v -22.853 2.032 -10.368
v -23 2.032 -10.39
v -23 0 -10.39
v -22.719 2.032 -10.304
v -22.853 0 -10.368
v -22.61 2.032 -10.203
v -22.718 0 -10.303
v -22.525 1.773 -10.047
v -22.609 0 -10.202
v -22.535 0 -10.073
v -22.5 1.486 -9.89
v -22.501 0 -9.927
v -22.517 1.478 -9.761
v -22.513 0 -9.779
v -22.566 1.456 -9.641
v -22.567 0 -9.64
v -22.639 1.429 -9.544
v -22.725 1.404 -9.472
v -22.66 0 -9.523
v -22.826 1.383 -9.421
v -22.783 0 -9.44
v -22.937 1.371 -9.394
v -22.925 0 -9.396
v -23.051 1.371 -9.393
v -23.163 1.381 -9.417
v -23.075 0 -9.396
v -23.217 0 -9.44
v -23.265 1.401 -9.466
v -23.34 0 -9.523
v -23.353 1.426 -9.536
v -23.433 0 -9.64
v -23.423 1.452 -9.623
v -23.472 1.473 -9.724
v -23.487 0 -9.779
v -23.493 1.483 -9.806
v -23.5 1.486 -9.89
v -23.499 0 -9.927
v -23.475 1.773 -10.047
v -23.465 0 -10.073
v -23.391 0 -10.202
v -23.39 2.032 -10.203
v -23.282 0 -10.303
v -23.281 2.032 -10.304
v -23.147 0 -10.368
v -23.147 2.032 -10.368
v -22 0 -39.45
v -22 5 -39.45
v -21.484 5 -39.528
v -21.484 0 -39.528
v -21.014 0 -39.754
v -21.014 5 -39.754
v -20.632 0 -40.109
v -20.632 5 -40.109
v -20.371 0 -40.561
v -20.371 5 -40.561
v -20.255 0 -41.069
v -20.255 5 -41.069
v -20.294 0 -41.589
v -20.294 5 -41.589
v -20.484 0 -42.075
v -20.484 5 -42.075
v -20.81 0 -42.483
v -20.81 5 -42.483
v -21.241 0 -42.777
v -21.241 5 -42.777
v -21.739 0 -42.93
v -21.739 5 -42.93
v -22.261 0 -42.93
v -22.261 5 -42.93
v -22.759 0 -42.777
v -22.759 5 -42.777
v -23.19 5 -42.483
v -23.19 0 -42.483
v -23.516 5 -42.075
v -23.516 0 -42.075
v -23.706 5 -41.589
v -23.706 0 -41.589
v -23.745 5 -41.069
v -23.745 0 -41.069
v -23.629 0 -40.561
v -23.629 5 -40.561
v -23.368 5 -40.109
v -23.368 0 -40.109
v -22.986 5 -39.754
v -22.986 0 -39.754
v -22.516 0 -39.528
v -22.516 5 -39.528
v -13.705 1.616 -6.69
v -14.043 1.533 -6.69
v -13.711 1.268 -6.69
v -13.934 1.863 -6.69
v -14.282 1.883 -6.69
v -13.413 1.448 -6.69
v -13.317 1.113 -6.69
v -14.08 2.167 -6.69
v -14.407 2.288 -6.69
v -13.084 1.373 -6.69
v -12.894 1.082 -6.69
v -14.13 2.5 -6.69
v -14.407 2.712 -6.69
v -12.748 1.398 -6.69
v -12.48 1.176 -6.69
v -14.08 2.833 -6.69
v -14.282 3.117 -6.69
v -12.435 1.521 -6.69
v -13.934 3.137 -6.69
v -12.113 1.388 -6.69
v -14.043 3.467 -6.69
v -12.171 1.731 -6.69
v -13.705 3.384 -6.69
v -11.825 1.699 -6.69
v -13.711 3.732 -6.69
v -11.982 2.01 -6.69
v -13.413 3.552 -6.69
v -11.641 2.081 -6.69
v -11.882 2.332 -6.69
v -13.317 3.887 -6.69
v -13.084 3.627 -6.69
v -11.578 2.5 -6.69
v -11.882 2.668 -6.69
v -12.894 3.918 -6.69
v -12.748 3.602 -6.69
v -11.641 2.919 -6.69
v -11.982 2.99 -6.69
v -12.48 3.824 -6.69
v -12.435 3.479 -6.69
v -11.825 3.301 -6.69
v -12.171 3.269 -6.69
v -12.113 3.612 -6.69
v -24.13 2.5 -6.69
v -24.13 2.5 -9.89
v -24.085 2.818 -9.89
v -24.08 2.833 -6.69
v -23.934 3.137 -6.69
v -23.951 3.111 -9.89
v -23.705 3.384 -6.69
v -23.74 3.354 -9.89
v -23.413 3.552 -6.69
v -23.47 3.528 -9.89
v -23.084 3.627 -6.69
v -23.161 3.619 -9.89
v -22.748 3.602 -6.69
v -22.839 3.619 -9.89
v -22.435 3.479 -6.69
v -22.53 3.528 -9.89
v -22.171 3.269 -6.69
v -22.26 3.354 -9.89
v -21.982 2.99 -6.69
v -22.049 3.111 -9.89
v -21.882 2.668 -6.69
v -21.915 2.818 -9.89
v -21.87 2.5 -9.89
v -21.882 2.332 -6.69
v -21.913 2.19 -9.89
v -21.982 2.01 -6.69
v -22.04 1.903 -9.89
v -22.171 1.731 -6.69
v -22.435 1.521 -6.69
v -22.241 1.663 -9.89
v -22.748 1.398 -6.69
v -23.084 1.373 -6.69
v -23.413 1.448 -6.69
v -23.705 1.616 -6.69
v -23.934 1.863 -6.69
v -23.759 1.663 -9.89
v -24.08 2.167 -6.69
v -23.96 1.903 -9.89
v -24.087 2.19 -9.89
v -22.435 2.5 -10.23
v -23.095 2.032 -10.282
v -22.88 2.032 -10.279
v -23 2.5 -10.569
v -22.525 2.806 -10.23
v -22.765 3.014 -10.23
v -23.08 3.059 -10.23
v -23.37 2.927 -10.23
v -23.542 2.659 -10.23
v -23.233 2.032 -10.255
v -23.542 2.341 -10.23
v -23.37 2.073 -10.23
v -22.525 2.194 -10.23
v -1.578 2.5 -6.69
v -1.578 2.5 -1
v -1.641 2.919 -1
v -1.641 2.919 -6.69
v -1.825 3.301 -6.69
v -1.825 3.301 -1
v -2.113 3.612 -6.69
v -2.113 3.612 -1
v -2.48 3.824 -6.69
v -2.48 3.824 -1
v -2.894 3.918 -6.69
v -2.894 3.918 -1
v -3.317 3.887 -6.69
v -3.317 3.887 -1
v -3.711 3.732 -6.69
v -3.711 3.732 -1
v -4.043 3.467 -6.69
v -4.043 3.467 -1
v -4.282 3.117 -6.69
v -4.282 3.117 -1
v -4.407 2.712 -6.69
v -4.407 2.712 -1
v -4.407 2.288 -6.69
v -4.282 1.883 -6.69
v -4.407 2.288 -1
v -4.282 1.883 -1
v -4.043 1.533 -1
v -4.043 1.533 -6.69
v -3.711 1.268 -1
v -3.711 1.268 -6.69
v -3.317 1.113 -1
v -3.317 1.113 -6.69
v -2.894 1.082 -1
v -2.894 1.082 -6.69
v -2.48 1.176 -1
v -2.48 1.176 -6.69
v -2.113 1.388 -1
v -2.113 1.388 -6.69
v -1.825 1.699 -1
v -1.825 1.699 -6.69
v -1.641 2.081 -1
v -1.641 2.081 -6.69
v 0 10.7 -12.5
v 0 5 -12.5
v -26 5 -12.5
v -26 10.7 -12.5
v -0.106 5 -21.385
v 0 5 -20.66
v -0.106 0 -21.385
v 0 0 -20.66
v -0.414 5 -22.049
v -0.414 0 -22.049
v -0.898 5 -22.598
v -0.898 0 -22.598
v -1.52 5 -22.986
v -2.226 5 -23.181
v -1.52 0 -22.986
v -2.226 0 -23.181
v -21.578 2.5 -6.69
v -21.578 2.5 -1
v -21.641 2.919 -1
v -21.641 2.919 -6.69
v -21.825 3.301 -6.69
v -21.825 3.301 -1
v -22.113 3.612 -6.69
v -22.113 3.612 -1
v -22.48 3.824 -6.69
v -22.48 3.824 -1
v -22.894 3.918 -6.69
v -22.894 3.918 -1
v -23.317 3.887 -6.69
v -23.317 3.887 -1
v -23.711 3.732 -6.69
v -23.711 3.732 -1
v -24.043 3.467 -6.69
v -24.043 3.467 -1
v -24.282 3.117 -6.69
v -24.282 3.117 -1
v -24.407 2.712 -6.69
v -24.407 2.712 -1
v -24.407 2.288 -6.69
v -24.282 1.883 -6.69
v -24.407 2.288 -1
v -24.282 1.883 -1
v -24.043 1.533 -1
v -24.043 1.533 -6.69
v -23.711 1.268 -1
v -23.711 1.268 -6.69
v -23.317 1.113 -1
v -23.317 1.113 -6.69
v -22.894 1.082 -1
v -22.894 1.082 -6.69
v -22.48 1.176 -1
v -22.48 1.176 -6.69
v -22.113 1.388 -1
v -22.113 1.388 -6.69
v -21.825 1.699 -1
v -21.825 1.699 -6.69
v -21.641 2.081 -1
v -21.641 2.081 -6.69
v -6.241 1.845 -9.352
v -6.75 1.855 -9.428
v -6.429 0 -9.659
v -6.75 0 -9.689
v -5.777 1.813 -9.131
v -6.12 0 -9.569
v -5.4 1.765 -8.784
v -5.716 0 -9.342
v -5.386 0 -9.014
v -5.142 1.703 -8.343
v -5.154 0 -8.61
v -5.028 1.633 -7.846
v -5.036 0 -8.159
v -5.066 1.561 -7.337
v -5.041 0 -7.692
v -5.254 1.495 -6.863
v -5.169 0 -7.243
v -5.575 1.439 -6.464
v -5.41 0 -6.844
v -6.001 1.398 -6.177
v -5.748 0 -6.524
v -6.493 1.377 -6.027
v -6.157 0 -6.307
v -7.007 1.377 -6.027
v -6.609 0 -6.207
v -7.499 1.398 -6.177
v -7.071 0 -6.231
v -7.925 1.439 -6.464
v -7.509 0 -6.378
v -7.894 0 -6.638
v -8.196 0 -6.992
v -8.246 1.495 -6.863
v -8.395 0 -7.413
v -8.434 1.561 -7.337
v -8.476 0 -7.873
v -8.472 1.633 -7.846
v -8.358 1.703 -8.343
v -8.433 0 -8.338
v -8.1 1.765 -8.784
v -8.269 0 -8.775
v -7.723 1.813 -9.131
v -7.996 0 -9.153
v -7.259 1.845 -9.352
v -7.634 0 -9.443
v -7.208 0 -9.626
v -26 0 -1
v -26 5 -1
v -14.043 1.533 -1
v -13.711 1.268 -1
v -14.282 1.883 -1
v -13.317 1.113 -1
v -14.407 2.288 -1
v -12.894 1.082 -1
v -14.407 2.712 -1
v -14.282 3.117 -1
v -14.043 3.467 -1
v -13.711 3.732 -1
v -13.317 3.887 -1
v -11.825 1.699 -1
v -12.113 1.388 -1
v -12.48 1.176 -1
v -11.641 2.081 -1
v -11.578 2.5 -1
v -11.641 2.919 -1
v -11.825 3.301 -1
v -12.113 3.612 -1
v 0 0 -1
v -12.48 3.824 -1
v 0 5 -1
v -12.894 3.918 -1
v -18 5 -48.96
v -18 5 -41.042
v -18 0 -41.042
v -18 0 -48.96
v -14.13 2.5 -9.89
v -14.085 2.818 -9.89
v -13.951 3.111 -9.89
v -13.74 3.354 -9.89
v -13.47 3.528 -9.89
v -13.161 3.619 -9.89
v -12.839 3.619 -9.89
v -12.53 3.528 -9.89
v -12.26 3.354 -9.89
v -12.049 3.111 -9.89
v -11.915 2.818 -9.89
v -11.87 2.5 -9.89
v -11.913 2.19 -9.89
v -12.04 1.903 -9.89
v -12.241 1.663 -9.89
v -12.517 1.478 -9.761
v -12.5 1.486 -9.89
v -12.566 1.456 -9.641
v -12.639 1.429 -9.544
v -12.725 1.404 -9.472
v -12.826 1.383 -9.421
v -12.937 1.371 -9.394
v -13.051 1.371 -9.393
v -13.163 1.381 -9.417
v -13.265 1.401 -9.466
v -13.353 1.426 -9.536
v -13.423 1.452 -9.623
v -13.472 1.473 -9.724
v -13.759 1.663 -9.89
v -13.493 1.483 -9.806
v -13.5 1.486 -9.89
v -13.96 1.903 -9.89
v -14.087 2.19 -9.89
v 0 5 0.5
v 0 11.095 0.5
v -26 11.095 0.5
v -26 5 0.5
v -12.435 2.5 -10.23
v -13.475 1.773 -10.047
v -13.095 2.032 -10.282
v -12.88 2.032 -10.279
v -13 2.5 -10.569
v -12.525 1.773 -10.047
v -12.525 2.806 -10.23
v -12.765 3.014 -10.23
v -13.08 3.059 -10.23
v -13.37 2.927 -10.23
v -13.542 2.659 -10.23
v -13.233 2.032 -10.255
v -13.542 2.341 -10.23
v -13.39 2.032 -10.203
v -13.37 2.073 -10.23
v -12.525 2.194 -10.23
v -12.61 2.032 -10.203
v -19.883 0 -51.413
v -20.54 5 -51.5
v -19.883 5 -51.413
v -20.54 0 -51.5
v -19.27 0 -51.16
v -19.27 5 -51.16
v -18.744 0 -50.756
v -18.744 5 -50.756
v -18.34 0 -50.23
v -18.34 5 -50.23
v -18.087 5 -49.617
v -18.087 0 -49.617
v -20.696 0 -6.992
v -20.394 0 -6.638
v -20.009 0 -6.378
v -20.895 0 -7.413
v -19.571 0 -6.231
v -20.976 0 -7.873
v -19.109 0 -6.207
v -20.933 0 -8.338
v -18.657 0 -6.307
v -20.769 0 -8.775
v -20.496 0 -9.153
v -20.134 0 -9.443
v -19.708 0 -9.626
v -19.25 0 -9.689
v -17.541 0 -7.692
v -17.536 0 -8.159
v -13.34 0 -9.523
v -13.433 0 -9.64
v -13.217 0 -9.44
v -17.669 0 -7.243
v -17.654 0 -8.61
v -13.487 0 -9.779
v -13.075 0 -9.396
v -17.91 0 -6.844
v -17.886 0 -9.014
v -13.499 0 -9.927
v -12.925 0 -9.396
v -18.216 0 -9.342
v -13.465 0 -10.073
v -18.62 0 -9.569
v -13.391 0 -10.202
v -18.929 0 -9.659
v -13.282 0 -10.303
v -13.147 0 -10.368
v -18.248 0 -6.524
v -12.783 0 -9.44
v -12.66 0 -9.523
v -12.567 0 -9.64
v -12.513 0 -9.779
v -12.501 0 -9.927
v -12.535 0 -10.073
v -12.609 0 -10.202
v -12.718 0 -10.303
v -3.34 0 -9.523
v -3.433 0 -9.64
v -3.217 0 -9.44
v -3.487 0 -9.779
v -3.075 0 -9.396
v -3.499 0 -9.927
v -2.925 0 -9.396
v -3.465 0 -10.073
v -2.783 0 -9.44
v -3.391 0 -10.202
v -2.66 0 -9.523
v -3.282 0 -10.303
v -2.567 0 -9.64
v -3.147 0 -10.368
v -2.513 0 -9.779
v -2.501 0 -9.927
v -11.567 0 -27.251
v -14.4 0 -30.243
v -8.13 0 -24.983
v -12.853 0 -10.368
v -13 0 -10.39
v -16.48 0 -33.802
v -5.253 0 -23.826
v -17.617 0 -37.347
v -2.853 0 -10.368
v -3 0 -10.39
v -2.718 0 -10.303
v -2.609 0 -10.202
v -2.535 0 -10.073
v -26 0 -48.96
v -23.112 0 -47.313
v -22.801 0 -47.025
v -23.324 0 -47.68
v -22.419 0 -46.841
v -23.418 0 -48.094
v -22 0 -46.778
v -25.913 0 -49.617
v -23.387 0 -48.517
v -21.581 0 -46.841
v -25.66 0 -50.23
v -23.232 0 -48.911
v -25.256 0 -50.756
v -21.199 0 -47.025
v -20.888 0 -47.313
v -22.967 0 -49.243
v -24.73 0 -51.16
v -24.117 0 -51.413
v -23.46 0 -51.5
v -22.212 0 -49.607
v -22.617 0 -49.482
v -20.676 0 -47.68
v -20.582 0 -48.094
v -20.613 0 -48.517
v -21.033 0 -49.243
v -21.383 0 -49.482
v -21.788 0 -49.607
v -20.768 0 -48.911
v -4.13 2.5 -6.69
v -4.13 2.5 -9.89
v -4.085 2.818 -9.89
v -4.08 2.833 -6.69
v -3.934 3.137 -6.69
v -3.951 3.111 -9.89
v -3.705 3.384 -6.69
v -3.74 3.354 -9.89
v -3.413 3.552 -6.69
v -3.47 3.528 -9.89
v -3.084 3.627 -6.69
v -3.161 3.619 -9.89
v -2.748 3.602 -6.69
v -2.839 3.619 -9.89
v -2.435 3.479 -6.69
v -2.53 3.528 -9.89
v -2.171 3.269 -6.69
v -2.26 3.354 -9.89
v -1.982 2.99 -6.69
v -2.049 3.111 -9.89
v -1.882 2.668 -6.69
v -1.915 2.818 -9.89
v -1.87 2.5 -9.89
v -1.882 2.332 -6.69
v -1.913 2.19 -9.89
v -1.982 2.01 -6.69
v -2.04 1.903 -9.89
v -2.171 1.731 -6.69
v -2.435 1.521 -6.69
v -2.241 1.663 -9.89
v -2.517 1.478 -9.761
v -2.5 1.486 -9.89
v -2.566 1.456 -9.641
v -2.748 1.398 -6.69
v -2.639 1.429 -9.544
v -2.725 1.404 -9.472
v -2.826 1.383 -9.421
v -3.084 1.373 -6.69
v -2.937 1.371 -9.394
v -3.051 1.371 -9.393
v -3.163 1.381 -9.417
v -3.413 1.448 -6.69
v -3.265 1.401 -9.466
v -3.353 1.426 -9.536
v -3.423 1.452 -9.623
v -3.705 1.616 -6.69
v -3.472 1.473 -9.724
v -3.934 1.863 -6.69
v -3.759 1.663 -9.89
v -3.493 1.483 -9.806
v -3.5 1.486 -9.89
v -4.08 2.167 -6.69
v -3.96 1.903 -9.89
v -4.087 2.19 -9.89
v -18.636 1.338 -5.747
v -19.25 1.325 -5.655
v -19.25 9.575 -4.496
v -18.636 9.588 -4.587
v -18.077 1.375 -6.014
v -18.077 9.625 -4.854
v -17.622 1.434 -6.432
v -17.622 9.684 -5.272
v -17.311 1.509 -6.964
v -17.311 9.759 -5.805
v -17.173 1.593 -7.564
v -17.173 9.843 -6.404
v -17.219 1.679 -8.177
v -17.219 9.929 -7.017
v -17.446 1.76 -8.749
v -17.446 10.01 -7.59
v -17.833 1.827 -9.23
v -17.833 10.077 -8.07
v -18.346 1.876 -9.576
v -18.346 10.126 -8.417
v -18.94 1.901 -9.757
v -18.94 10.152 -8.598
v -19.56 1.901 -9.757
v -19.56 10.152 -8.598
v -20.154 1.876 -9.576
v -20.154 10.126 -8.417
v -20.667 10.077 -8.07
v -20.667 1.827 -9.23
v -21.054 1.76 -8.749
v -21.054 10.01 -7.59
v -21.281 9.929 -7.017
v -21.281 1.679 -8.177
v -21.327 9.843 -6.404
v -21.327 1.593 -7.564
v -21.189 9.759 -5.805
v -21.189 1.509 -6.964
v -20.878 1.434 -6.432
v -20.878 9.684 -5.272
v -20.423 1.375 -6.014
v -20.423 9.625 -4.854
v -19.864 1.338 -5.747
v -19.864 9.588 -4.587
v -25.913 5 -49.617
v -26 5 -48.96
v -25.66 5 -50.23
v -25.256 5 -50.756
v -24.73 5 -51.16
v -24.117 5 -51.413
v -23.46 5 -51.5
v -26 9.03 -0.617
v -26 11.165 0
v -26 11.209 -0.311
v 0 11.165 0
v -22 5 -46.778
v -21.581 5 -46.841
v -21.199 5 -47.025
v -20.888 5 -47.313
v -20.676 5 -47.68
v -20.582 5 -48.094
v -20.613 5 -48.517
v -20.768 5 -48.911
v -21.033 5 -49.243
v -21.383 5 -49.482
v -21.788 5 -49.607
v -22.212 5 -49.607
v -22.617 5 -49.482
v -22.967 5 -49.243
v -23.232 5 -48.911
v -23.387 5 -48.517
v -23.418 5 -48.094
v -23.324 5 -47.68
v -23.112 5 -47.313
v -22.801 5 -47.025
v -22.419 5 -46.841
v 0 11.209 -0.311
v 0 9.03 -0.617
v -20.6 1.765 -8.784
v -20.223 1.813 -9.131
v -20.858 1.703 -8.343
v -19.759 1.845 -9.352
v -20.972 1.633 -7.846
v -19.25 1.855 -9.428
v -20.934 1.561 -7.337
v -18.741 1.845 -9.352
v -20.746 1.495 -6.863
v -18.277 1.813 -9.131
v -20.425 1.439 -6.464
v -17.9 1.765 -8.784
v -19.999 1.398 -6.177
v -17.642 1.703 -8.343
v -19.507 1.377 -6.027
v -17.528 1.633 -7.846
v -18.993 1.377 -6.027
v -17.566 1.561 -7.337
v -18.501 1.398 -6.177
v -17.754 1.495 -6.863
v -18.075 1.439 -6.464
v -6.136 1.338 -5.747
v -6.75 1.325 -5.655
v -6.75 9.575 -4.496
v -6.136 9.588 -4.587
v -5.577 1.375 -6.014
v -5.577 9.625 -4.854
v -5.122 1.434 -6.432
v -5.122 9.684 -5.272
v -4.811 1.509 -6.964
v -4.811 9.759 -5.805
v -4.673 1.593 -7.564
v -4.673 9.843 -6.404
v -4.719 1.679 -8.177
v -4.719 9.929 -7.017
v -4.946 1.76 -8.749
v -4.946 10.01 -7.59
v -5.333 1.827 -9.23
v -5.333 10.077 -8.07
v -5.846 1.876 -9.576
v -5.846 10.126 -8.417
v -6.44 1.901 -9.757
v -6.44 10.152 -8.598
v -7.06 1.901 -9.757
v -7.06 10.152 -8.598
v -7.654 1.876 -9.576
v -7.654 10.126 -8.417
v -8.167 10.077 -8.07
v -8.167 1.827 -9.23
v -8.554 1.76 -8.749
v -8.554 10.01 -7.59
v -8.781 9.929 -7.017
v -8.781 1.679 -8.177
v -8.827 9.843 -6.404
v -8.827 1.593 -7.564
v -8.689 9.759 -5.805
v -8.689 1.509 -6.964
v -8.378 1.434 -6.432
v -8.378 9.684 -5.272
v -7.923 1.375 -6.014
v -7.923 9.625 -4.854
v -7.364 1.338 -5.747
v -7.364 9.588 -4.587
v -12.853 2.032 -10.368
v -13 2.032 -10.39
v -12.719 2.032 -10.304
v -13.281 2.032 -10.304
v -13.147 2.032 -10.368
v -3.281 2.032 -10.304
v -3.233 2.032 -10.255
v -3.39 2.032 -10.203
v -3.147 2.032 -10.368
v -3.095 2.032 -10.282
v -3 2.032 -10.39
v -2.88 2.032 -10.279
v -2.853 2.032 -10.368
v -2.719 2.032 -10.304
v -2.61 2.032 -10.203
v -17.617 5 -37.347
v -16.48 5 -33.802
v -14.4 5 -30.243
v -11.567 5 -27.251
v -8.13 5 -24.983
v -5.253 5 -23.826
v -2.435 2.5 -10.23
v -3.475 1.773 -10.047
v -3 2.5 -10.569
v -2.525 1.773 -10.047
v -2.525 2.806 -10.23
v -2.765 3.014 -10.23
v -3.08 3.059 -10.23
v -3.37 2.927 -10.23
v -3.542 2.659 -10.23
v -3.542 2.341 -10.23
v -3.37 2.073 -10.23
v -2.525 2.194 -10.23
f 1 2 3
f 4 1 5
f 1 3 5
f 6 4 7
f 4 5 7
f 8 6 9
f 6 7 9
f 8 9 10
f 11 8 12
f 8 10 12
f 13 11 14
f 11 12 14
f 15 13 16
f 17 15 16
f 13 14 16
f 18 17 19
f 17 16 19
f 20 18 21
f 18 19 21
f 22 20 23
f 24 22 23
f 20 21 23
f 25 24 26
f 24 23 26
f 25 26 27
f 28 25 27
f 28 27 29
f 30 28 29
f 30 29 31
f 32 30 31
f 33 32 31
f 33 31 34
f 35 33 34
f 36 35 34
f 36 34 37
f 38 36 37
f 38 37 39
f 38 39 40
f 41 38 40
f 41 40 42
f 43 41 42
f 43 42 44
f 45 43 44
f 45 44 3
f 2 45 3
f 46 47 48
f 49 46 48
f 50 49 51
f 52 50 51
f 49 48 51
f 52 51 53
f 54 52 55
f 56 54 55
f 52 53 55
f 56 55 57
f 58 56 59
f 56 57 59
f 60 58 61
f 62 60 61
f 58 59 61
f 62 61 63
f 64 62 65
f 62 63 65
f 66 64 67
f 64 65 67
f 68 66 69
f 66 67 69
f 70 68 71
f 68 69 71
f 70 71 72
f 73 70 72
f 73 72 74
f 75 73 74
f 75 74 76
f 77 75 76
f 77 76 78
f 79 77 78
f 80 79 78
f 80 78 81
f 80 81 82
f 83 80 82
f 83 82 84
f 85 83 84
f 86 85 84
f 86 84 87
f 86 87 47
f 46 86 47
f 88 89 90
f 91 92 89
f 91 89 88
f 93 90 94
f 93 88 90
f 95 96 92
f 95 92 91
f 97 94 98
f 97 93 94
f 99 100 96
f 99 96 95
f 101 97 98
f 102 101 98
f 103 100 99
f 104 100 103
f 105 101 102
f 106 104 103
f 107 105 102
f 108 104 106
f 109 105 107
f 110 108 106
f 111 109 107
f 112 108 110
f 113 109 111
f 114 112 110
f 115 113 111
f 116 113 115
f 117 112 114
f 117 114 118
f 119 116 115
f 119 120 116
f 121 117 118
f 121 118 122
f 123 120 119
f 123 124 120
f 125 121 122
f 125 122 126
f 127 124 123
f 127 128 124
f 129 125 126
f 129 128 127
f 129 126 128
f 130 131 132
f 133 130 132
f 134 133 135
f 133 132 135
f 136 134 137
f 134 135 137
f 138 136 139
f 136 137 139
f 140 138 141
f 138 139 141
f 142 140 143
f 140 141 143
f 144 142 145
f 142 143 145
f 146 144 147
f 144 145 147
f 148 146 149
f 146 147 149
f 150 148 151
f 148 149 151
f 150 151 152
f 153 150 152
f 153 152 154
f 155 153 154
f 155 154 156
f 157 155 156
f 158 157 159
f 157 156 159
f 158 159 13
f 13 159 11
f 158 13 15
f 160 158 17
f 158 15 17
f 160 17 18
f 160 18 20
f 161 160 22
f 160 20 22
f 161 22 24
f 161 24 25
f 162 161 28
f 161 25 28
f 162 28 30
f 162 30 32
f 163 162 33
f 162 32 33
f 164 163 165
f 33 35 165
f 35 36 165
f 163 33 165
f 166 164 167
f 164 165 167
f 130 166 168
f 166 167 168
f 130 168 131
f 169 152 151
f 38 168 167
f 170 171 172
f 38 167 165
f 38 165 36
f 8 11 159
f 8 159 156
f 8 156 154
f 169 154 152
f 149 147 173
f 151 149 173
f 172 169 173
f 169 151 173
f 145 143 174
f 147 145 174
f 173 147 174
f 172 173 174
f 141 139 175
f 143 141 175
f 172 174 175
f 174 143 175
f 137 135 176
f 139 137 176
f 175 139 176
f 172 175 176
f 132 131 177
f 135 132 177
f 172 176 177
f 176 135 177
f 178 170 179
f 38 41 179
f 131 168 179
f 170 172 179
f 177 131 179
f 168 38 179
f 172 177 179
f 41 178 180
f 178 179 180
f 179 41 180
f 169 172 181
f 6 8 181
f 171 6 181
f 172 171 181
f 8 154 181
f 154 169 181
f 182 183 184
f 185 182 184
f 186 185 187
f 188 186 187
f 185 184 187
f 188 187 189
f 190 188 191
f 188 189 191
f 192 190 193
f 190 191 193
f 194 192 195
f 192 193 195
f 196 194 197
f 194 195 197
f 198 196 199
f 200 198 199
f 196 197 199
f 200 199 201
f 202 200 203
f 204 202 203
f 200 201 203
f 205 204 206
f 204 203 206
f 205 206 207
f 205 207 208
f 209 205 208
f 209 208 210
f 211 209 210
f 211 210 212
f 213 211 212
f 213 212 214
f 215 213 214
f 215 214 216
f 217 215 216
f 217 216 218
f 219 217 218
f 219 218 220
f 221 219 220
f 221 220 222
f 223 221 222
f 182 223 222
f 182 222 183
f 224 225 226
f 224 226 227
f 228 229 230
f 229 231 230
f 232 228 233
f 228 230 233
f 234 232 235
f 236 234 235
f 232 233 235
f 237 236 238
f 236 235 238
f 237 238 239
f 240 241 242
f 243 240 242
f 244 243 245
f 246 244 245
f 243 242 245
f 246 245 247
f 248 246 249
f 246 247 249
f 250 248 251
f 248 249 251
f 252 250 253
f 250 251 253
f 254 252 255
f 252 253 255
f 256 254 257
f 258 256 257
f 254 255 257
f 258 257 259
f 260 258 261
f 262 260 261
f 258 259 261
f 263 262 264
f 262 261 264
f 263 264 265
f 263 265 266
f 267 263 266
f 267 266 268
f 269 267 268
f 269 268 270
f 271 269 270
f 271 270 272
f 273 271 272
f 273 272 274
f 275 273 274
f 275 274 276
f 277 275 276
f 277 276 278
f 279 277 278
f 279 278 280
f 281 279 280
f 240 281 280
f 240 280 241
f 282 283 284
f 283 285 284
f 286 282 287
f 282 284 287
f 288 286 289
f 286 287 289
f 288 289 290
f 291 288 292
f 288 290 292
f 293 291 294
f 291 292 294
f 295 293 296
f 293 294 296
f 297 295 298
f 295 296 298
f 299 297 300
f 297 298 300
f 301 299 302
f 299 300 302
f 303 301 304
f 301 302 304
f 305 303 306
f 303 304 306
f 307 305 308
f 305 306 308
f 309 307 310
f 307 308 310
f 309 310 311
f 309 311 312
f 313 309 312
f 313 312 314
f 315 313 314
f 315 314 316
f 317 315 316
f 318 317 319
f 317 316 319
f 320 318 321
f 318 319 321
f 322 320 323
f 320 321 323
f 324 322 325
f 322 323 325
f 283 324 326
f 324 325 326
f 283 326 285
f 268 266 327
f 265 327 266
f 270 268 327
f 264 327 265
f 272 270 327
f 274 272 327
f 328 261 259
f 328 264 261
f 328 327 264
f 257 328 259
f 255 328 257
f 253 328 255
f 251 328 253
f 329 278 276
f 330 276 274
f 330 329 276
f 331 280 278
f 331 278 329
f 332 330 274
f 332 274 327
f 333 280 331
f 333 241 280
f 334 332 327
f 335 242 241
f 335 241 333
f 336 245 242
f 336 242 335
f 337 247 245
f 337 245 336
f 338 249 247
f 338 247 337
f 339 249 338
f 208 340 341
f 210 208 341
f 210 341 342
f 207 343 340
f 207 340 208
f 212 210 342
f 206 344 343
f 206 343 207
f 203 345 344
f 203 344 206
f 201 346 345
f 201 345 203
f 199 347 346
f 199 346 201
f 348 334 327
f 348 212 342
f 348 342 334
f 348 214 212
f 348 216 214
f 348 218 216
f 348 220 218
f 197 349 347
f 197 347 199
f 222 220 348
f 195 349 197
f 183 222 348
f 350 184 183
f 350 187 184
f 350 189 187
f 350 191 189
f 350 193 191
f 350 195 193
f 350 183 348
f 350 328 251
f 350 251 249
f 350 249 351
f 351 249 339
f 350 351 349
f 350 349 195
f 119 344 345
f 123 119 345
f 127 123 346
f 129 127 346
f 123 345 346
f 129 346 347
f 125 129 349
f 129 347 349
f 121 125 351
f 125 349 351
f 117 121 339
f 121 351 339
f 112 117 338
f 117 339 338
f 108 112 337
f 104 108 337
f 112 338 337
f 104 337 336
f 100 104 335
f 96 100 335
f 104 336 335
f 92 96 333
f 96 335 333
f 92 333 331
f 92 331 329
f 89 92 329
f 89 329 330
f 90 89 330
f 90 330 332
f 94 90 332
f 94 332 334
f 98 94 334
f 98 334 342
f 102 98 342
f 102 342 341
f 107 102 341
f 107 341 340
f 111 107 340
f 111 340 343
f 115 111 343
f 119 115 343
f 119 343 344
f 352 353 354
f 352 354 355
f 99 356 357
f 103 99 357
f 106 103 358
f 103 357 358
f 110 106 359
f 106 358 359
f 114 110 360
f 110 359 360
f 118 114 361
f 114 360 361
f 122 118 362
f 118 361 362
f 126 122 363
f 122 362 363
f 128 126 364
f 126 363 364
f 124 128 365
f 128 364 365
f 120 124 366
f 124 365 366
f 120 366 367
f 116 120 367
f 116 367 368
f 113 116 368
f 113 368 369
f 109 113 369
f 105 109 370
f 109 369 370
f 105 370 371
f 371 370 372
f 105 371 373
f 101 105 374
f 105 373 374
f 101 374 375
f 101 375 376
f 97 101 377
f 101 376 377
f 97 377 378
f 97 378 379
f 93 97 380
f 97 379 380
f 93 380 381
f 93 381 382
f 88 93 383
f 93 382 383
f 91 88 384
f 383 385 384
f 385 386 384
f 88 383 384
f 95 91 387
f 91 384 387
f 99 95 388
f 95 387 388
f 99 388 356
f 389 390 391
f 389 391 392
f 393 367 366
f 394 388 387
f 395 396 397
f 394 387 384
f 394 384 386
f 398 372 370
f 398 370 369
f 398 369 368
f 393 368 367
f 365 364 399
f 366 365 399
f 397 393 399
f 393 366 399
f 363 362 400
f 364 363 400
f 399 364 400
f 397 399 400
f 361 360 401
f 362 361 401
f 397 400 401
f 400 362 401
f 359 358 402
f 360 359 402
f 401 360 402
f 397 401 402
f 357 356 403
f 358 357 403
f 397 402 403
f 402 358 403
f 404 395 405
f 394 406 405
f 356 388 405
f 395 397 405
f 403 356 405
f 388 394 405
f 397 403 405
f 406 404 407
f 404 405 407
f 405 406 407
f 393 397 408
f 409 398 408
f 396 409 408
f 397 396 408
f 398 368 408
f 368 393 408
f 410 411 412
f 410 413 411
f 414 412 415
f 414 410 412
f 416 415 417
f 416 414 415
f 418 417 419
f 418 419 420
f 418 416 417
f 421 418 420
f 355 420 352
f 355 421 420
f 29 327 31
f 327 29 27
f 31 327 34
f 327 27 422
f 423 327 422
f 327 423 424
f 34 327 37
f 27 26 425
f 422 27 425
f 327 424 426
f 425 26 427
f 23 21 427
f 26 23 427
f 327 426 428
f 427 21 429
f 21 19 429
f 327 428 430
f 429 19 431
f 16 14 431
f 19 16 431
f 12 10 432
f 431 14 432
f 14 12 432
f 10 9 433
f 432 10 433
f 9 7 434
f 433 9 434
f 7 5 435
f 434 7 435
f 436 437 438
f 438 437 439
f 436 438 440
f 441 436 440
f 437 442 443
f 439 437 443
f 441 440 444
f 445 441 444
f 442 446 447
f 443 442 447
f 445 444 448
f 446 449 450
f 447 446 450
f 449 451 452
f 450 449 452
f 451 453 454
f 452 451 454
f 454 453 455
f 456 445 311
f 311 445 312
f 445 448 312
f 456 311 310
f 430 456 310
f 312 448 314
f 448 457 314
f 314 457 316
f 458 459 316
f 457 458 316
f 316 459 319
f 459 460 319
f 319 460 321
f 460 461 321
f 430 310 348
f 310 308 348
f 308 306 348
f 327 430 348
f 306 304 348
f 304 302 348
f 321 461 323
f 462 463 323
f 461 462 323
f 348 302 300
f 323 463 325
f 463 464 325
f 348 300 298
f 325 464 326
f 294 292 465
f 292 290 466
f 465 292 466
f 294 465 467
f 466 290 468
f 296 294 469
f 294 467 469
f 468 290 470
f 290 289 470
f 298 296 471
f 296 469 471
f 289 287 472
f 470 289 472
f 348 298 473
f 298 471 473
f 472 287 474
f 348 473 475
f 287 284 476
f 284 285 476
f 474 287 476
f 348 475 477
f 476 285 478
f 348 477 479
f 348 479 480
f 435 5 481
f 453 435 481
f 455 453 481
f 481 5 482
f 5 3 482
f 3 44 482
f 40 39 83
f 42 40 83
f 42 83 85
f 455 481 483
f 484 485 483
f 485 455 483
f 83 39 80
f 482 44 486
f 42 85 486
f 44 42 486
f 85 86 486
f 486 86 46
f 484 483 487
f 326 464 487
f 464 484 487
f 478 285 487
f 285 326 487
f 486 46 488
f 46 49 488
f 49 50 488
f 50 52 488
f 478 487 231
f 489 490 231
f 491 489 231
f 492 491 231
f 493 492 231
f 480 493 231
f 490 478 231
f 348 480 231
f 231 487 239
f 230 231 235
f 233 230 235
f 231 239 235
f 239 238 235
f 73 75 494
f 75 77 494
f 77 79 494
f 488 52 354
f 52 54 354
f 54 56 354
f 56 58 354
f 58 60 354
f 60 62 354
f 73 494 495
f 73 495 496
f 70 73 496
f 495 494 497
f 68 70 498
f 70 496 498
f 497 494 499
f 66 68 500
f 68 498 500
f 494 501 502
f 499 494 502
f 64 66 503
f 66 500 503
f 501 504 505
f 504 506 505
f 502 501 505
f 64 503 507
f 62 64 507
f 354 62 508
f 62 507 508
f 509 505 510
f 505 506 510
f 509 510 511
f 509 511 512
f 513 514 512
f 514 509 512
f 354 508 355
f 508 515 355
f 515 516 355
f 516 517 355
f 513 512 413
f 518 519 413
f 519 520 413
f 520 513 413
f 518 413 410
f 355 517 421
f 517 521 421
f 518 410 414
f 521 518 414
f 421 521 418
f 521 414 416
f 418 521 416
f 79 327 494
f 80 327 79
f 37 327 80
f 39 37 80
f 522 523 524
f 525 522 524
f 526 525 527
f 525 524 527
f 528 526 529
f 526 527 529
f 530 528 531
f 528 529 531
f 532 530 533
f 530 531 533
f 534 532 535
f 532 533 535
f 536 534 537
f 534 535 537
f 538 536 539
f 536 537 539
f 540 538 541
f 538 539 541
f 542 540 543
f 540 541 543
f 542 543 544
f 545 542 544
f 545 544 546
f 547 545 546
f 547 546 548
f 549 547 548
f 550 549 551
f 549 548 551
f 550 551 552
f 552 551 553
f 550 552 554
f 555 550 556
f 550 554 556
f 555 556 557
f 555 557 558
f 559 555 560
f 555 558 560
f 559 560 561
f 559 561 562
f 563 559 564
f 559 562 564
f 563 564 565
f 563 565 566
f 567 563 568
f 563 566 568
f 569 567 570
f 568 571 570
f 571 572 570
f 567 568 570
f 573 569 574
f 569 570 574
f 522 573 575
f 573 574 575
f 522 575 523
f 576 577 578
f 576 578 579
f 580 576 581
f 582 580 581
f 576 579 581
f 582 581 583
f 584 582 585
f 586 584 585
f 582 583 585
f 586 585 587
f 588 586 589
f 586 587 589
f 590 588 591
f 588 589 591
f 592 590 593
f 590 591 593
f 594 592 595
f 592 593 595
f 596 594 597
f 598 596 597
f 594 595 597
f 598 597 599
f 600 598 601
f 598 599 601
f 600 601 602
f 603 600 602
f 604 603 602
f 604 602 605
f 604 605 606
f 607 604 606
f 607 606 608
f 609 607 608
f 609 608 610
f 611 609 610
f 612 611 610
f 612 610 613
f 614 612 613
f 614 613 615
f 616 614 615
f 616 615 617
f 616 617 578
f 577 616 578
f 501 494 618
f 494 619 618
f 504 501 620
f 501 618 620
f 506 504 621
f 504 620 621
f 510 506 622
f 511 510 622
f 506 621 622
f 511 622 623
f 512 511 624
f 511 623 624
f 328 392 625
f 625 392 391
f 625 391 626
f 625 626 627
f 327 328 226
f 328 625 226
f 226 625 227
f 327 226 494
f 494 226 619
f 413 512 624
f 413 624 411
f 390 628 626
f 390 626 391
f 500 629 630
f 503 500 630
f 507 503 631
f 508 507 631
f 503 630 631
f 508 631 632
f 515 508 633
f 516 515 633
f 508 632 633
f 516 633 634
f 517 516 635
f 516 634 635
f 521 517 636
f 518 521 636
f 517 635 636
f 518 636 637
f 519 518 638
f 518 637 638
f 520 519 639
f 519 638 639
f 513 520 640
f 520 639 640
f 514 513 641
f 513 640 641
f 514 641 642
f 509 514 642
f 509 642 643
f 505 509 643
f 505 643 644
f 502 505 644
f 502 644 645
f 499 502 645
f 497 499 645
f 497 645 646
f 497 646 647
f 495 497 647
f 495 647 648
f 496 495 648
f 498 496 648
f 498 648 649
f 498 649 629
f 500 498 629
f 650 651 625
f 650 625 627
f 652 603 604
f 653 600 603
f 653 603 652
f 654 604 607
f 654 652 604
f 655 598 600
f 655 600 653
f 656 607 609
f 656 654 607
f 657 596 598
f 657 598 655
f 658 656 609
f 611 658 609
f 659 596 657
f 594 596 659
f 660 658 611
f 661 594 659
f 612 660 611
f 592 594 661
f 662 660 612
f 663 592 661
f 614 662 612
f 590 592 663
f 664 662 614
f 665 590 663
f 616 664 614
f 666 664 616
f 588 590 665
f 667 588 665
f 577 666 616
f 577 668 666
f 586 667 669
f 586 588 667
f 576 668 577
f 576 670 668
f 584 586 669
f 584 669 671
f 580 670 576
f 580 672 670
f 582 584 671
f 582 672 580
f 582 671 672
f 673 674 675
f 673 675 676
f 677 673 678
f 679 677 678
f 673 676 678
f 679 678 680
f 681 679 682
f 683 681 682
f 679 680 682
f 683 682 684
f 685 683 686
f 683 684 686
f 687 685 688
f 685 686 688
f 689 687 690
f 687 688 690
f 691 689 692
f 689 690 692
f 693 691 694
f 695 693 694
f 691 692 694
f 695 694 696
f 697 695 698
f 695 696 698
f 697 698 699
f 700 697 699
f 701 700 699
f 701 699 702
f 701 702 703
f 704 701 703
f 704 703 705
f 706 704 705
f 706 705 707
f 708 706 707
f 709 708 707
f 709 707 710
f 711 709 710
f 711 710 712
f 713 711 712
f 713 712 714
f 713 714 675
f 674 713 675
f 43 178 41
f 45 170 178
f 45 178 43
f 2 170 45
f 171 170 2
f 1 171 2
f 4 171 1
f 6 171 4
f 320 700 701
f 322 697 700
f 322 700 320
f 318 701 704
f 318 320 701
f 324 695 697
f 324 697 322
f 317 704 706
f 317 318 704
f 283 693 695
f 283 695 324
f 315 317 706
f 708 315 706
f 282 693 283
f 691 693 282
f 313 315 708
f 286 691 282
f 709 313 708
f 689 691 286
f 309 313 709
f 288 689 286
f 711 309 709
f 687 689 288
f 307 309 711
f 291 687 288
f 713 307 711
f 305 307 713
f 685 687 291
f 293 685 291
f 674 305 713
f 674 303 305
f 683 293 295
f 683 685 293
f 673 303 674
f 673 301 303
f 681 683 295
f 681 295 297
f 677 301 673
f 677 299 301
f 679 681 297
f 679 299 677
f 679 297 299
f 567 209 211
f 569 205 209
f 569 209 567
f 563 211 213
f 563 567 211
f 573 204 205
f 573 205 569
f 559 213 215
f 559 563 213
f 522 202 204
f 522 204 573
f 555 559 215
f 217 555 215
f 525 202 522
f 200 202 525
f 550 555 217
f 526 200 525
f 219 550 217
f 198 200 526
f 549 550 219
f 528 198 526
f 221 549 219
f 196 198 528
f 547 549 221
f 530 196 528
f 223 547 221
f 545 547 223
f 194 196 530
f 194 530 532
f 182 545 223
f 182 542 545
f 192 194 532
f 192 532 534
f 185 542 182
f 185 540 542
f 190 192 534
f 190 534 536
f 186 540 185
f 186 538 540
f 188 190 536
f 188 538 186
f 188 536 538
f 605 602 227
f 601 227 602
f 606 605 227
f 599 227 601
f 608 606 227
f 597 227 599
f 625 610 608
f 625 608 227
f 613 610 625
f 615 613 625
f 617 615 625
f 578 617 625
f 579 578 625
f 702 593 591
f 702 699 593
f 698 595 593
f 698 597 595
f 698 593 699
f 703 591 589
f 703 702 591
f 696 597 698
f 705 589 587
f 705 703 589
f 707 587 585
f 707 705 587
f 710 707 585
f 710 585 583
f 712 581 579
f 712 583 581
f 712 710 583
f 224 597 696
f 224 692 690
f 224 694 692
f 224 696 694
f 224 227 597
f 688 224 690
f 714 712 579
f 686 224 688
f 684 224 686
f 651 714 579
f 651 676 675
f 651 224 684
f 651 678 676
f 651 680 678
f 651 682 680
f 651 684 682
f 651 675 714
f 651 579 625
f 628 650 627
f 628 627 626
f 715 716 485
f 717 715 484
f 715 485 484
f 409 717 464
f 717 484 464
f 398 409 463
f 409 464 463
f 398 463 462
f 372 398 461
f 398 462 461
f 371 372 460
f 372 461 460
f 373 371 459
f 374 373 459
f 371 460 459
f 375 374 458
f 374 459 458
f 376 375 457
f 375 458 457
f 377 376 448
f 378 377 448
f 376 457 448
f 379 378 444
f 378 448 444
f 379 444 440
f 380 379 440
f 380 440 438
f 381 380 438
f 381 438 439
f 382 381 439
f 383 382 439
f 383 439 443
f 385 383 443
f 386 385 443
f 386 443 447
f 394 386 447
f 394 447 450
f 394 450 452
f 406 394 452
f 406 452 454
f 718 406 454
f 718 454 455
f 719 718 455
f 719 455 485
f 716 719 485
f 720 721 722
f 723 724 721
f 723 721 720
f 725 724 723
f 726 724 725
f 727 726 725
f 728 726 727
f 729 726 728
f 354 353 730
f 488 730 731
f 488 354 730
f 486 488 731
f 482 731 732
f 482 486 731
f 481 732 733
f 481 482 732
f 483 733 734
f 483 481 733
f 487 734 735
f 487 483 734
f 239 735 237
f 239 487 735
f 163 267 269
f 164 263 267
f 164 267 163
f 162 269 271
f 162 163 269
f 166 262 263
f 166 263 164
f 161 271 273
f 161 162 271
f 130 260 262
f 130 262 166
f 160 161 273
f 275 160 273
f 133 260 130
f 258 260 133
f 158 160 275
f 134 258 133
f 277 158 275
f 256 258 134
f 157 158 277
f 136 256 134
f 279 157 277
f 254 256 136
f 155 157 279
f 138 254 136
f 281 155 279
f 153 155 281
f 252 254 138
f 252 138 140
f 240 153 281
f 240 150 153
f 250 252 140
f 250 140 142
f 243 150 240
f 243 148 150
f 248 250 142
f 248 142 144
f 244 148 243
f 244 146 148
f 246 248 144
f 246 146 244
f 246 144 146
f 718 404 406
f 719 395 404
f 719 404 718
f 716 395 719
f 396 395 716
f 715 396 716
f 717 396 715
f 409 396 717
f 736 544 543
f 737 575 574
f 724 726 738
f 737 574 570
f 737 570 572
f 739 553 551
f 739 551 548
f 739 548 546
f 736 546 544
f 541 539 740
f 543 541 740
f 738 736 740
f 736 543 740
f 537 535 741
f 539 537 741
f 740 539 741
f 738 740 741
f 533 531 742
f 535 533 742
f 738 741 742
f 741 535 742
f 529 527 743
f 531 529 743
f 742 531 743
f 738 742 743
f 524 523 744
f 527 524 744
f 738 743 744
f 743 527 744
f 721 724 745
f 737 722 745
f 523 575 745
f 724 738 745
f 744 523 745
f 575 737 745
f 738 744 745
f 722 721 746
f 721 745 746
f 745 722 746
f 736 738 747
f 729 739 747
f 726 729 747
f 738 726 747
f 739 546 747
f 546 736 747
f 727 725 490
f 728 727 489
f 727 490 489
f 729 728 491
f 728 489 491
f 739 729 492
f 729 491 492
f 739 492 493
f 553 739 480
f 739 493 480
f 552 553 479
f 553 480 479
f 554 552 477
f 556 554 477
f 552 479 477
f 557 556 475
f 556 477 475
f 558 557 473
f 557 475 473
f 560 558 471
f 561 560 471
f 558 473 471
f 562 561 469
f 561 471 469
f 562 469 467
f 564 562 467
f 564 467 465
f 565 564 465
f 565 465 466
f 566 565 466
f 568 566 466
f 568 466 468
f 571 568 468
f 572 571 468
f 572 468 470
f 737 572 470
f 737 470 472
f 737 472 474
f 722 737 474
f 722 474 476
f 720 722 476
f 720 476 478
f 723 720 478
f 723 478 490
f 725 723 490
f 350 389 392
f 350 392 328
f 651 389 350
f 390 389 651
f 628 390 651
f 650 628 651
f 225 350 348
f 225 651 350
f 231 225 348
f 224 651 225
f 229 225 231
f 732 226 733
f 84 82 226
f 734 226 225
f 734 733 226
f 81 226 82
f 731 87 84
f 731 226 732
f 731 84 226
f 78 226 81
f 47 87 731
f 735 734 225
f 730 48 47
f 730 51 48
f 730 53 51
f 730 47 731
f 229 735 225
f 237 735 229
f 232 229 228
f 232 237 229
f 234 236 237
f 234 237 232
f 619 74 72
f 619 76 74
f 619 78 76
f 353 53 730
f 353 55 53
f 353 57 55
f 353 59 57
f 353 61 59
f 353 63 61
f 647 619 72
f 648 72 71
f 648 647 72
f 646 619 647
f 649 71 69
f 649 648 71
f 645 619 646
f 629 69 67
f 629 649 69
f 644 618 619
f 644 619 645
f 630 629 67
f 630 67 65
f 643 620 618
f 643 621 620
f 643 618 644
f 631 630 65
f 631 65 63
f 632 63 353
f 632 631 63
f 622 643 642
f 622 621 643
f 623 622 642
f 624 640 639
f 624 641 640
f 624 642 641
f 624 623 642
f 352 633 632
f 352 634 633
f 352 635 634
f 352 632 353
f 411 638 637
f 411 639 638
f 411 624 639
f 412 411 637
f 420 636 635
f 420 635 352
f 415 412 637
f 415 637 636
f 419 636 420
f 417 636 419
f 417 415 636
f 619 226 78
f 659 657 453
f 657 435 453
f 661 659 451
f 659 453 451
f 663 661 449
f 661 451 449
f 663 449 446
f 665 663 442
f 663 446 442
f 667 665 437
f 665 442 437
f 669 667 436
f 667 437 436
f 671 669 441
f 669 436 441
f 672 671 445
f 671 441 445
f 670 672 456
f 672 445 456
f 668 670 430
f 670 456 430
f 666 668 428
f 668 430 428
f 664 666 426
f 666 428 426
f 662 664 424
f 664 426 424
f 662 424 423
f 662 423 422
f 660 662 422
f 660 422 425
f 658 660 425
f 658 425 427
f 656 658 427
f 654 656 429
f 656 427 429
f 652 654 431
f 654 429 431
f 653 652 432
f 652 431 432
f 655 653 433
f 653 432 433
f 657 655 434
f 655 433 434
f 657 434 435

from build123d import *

# Parameters (mm, degrees)
SKETCH1_W                       = 26
SKETCH1_H                       = 51.5
EXTRUDE1_DEPTH                  = 5
SKETCH2_W                       = 18
SKETCH2_H                       = 28.3
EXTRUDE2_DEPTH                  = 5
FILLET1_R                       = 2.54
FILLET2_R                       = 18
EXTRUDE3_DEPTH                  = 26
SKETCH4_W                       = 26
SKETCH4_H                       = 5
EXTRUDE4_DEPTH                  = 1
F_4_40_TAPPED_HOLE1_D           = 2.2606
F_4_40_TAPPED_HOLE1_DEPTH       = 10.1346
F_4_40_TAPPED_HOLE1_CBORE_D     = 2.8448
F_4_40_TAPPED_HOLE1_CBORE_DEPTH = 8.2296
F_4_40_TAPPED_HOLE1_TIP         = 0.679152758
SKETCH6_R                       = 1.75
EXTRUDE5_DEPTH                  = 6.0000001
F_8_32_TAPPED_HOLE1_D           = 3.4544
F_8_32_TAPPED_HOLE1_DEPTH       = 10.7188
F_8_32_TAPPED_HOLE1_CBORE_D     = 4.1656
F_8_32_TAPPED_HOLE1_CBORE_DEPTH = 8.3312
F_8_32_TAPPED_HOLE1_TIP         = 1.037806461
F_4_40_TAPPED_HOLE2_D           = 2.2606
F_4_40_TAPPED_HOLE2_DEPTH       = 8.89
F_4_40_TAPPED_HOLE2_CBORE_D     = 2.8448
F_4_40_TAPPED_HOLE2_CBORE_DEPTH = 5.6896
F_4_40_TAPPED_HOLE2_TIP         = 0.679152758
SKETCH9_R                       = 0.5
EXTRUDE6_DEPTH                  = 2.032
BOSS_EXTRUDE2_DEPTH             = 26


with BuildPart() as part:
    # Sketch1 → Extrude1 (new body)
    with BuildSketch(Plane(origin=(0, 0, 0), x_dir=(1, 0, 0), z_dir=(0, 1, 0))):
        with Locations((-13, 25.75)):
            Rectangle(SKETCH1_W, SKETCH1_H)
    extrude(amount=EXTRUDE1_DEPTH)

    # Sketch2 → Extrude2 (cut)
    with BuildSketch(Plane(origin=(0, 5, 0), x_dir=(1, 0, 0), z_dir=(0, 1, 0))):
        with Locations((-9, 37.35)):
            Rectangle(SKETCH2_W, SKETCH2_H)
    extrude(amount=-EXTRUDE2_DEPTH, mode=Mode.SUBTRACT)

    # Fillet1
    fillet1_edges = [part.edges().sort_by_distance(p)[0] for p in [
        (0, 2.5, -23.2),
        (-18, 2.5, -51.5),
        (-26, 2.5, -51.5),
    ]]
    fillet(fillet1_edges, radius=FILLET1_R)

    # Fillet2
    fillet2_edges = [part.edges().sort_by_distance(p)[0] for p in [
        (-18, 2.5, -23.2),
    ]]
    fillet(fillet2_edges, radius=FILLET2_R)

    # Sketch3 → Extrude3 (add, through all)
    with BuildSketch(Plane(origin=(0, 0, 0), x_dir=(0, 0, -1), z_dir=(1, 0, 0))):
        Polygon((0, 5), (12.5, 5), (12.5, 10.7), (0.616783175, 9.029922788), (0.310602353, 11.20851254), (0, 11.164860226), align=None)
    extrude(amount=-EXTRUDE3_DEPTH)

    # Sketch4 → Extrude4 (cut)
    with BuildSketch(Plane.XY):
        with Locations((-13, 2.5)):
            Rectangle(SKETCH4_W, SKETCH4_H)
    extrude(amount=-EXTRUDE4_DEPTH, mode=Mode.SUBTRACT)

    # #4-40 Tapped Hole1
    with Locations(Plane(origin=(-22, 5, -48.2), x_dir=(0, 0, 1), z_dir=(0, 1, 0))):
        with Locations((0, 0)):
            CounterBoreHole(F_4_40_TAPPED_HOLE1_D / 2, F_4_40_TAPPED_HOLE1_CBORE_D / 2, F_4_40_TAPPED_HOLE1_CBORE_DEPTH, depth=F_4_40_TAPPED_HOLE1_DEPTH)
            with Locations((0, 0, -(F_4_40_TAPPED_HOLE1_DEPTH + F_4_40_TAPPED_HOLE1_TIP / 2))):  # 118° drill point
                Cone(0, F_4_40_TAPPED_HOLE1_D / 2, F_4_40_TAPPED_HOLE1_TIP, mode=Mode.SUBTRACT)

    # Sketch6 → Extrude5 (cut, through all)
    with BuildSketch(Plane(origin=(0, 5, 0), x_dir=(1, 0, 0), z_dir=(0, 1, 0))):
        with Locations(Location((-22, 41.2, 0), (0, 0, 270))):  # turned: the seam where the file's is
            Circle(SKETCH6_R)
    extrude(amount=-EXTRUDE5_DEPTH, mode=Mode.SUBTRACT)

    # #8-32 Tapped Hole1
    with Locations(Plane(origin=(-19.25, 9.864961394, -6.558391588), x_dir=(0, -0.139173101, 0.990268069), z_dir=(0, 0.990268069, 0.139173101))):
        with Locations((0, 0), (0, 12.5)):
            CounterBoreHole(F_8_32_TAPPED_HOLE1_D / 2, F_8_32_TAPPED_HOLE1_CBORE_D / 2, F_8_32_TAPPED_HOLE1_CBORE_DEPTH, depth=F_8_32_TAPPED_HOLE1_DEPTH)
            with Locations((0, 0, -(F_8_32_TAPPED_HOLE1_DEPTH + F_8_32_TAPPED_HOLE1_TIP / 2))):  # 118° drill point
                Cone(0, F_8_32_TAPPED_HOLE1_D / 2, F_8_32_TAPPED_HOLE1_TIP, mode=Mode.SUBTRACT)

    # #4-40 Tapped Hole2
    with Locations(Plane(origin=(-23, 2.5, -1), x_dir=(1, 0, 0), z_dir=(0, 0, 1))):
        with Locations((0, 0), (10, 0), (20, 0)):
            CounterBoreHole(F_4_40_TAPPED_HOLE2_D / 2, F_4_40_TAPPED_HOLE2_CBORE_D / 2, F_4_40_TAPPED_HOLE2_CBORE_DEPTH, depth=F_4_40_TAPPED_HOLE2_DEPTH)
            with Locations((0, 0, -(F_4_40_TAPPED_HOLE2_DEPTH + F_4_40_TAPPED_HOLE2_TIP / 2))):  # 118° drill point
                Cone(0, F_4_40_TAPPED_HOLE2_D / 2, F_4_40_TAPPED_HOLE2_TIP, mode=Mode.SUBTRACT)

    # Sketch9 → Extrude6 (cut)
    with BuildSketch(Plane.XZ):
        with Locations(Location((-23, -9.89, 0), (0, 0, 270))):  # turned: the seam where the file's is
            Circle(SKETCH9_R)
        with Locations(Location((-13, -9.89, 0), (0, 0, 270))):  # turned: the seam where the file's is
            Circle(SKETCH9_R)
        with Locations(Location((-3, -9.89, 0), (0, 0, 270))):  # turned: the seam where the file's is
            Circle(SKETCH9_R)
    extrude(amount=-EXTRUDE6_DEPTH, mode=Mode.SUBTRACT)

    # Sketch12 → Boss-Extrude2 (add)
    with BuildSketch(Plane(origin=(0, 0, 0), x_dir=(0, 0, -1), z_dir=(1, 0, 0))):
        Polygon((0, 11.164860226), (-0.5, 11.094589808), (-0.5, 5), (0, 5), align=None)
    extrude(amount=-BOSS_EXTRUDE2_DEPTH)


solid = part.part
